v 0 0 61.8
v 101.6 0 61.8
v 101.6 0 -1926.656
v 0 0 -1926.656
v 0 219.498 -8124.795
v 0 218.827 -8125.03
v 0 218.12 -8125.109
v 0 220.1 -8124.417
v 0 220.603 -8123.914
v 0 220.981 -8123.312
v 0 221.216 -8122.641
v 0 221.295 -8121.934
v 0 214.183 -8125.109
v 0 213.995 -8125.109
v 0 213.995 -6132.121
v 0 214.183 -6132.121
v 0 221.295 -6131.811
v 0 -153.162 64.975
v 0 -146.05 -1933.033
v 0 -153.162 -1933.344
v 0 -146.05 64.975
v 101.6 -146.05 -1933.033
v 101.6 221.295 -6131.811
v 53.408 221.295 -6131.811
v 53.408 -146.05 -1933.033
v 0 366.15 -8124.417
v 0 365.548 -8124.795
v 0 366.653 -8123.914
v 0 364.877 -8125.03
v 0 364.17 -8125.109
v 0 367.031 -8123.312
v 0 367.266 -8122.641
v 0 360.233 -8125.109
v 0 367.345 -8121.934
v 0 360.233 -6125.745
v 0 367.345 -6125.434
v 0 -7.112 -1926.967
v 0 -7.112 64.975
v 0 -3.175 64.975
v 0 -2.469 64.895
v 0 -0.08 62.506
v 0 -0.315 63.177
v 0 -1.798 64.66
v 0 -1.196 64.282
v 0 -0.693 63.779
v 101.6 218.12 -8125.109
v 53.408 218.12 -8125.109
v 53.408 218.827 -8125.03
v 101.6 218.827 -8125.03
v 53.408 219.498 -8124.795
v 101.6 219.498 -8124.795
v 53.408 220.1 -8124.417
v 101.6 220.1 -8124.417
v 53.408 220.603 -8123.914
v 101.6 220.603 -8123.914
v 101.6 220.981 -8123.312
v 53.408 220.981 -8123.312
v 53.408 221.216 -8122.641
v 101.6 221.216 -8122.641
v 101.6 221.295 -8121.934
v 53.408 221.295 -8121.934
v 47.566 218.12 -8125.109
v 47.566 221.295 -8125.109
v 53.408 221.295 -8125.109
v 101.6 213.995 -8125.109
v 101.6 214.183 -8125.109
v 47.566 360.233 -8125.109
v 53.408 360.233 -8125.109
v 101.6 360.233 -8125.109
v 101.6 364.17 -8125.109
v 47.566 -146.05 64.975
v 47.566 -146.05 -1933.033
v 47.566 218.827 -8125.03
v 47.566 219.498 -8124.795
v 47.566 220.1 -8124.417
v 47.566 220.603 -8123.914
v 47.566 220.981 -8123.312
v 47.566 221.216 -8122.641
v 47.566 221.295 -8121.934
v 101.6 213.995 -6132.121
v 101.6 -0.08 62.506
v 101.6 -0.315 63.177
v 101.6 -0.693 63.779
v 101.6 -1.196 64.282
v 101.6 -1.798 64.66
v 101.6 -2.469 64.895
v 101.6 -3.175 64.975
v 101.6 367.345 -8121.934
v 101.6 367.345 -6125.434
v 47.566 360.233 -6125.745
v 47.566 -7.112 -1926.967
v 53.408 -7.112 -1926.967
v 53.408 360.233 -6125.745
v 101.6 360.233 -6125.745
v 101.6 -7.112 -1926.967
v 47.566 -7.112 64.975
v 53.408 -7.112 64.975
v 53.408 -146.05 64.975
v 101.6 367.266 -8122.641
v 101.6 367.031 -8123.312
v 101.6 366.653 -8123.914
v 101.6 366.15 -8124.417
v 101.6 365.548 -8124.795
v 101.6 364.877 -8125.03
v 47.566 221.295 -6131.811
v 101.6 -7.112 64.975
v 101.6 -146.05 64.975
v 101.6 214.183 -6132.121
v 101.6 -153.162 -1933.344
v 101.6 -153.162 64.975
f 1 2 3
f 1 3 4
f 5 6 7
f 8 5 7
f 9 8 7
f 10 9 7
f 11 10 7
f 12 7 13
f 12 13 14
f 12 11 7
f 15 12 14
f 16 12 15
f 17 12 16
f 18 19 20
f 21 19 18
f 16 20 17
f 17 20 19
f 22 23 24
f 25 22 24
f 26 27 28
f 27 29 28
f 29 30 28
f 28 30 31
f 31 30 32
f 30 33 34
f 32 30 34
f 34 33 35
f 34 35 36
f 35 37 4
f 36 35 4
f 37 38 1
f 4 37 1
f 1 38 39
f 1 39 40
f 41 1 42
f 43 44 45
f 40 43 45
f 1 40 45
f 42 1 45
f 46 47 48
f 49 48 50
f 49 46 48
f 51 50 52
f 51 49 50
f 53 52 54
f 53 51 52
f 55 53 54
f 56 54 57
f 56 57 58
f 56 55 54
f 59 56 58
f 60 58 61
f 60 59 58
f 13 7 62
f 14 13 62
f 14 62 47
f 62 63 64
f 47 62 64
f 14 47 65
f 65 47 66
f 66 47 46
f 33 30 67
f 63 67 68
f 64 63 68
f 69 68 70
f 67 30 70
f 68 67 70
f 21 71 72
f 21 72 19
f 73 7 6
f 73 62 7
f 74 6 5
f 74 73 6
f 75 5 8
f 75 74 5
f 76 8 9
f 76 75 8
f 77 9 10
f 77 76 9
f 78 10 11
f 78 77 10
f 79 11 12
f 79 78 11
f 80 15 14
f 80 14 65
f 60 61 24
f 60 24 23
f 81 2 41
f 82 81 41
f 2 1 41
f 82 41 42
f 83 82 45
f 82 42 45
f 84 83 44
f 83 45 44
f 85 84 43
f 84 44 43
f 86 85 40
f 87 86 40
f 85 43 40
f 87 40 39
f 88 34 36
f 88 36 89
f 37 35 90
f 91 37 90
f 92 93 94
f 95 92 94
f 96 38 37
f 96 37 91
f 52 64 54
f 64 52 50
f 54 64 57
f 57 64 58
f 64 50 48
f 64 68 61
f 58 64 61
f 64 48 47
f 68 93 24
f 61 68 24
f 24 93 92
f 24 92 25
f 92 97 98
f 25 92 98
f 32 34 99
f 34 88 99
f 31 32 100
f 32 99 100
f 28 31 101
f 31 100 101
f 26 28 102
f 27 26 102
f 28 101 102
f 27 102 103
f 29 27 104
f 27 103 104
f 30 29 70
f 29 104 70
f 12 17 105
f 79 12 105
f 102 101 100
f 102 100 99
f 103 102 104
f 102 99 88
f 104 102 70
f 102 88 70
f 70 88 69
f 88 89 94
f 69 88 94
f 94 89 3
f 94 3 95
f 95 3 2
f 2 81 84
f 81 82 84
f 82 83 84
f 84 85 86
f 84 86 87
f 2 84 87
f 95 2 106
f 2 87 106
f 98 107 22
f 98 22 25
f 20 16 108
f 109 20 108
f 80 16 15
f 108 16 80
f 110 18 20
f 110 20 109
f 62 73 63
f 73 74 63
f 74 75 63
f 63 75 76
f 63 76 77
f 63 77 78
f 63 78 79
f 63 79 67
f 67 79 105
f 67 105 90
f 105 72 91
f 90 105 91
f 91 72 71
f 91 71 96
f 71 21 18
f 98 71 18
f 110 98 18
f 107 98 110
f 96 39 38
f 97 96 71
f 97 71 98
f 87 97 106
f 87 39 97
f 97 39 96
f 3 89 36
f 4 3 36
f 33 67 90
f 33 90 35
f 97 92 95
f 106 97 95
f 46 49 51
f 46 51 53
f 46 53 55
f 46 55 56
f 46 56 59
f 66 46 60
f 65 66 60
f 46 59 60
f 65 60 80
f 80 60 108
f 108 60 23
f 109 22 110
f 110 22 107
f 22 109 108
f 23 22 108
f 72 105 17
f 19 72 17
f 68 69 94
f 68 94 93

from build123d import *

# Parameters (mm, degrees)
BOSS_EXTRUDE1_DEPTH = 14.541598669
BOSS_EXTRUDE2_DEPTH = 11.109177684
BOSS_EXTRUDE5_DEPTH = 53.865447751
BOSS_EXTRUDE6_DEPTH = 51.790096061
FILLET2_R           = 3.175
SKETCH9_W           = 101.6
SKETCH9_H           = 1992.988096061
BOSS_EXTRUDE7_DEPTH = 0.188178657
FILLET3_R           = 3.175


with BuildPart() as part:
    # Sweep1: sweep along a path in Sketch2
    with BuildLine(Plane(origin=(0, 0, 0), x_dir=(0, 0, -1), z_dir=(1, 0, 0))) as sweep1_path:
        Line((0, -76.581240533), (1930, -76.581240533))
        Line((1930, -76.581240533), (6128.777671415, 290.764206382))
        Line((6128.777671415, 290.764206382), (8058.777671415, 290.764206382))
    # Sketch1 → Sweep1 (sweep)
    with BuildSketch(Plane.XY):
        Polygon((0, -0.000240533), (101.6, -0.000240533), (101.6, -7.112240533), (53.408035714, -7.112240533), (53.408035714, -146.050240533), (101.6, -146.050240533), (101.6, -153.162240533), (0, -153.162240533), (0, -146.050240533), (47.566035714, -146.050240533), (47.566035714, -7.112240533), (0, -7.112240533), align=None)
    sweep(path=sweep1_path.line, transition=Transition.RIGHT)

    # Sketch4 → Boss-Extrude1 (add)
    with BuildSketch(Plane(origin=(0, 0, -8058.777671415), x_dir=(-1, 0, 0), z_dir=(0, 0, -1))):
        Polygon((0, 360.233206382), (0, 367.345206382), (-101.6, 367.345206382), (-101.6, 360.233206382), (-53.408035714, 360.233206382), (-53.408035714, 221.295206382), (-101.6, 221.295206382), (-101.6, 214.183206382), (0, 214.183206382), (0, 221.295206382), (-47.566035714, 221.295206382), (-47.566035714, 360.233206382), align=None)
    extrude(amount=BOSS_EXTRUDE1_DEPTH)

    # Sketch5 → Boss-Extrude2 (add)
    with BuildSketch(Plane.XY):
        Polygon((0, -0.000240533), (0, -7.112240533), (47.566035714, -7.112240533), (47.566035714, -146.050240533), (0, -146.050240533), (0, -153.162240533), (101.6, -153.162240533), (101.6, -146.050240533), (53.408035714, -146.050240533), (53.408035714, -7.112240533), (101.6, -7.112240533), (101.6, -0.000240533), align=None)
    extrude(amount=BOSS_EXTRUDE2_DEPTH)

    # Sketch7 → Boss-Extrude5 (add)
    with BuildSketch(Plane.XY.offset(11.109177684)):
        Polygon((101.6, -7.112240533), (101.6, -0.000240533), (0, -0.000240533), (0, -7.112240533), (47.566035714, -7.112240533), (47.566035714, -146.050240533), (0, -146.050240533), (0, -153.162240533), (101.6, -153.162240533), (101.6, -146.050240533), (53.408035714, -146.050240533), (53.408035714, -7.112240533), align=None)
    extrude(amount=BOSS_EXTRUDE5_DEPTH)

    # Sketch8 → Boss-Extrude6 (add)
    with BuildSketch(Plane(origin=(0, 0, -8073.319270083), x_dir=(-1, 0, 0), z_dir=(0, 0, -1))):
        Polygon((-47.566035714, 221.295206382), (-47.566035714, 360.233206382), (0, 360.233206382), (0, 367.345206382), (-101.6, 367.345206382), (-101.6, 360.233206382), (-53.408035714, 360.233206382), (-53.408035714, 221.295206382), (-101.6, 221.295206382), (-101.6, 214.183206382), (0, 214.183206382), (0, 221.295206382), align=None)
    extrude(amount=BOSS_EXTRUDE6_DEPTH)

    # Fillet2
    fillet2_edges = [part.edges().sort_by_distance(p)[0] for p in [
        (50.8, -0.000240533, 64.974625435),
        (50.8, 367.345206382, -8125.109366144),
    ]]
    fillet(fillet2_edges, radius=FILLET2_R)

    # Sketch9 → Boss-Extrude7 (add)
    with BuildSketch(Plane.XZ.offset(-214.183206382)):
        with Locations((50.8, -7128.615318114)):
            Rectangle(SKETCH9_W, SKETCH9_H)
    extrude(amount=BOSS_EXTRUDE7_DEPTH)

    # Fillet3
    fillet3_edges = [part.edges().sort_by_distance(p)[0] for p in [
        (23.783017857, 221.295206382, -8125.109366144),
        (77.504017857, 221.295206382, -8125.109366144),
    ]]
    fillet(fillet3_edges, radius=FILLET3_R)


solid = part.part
